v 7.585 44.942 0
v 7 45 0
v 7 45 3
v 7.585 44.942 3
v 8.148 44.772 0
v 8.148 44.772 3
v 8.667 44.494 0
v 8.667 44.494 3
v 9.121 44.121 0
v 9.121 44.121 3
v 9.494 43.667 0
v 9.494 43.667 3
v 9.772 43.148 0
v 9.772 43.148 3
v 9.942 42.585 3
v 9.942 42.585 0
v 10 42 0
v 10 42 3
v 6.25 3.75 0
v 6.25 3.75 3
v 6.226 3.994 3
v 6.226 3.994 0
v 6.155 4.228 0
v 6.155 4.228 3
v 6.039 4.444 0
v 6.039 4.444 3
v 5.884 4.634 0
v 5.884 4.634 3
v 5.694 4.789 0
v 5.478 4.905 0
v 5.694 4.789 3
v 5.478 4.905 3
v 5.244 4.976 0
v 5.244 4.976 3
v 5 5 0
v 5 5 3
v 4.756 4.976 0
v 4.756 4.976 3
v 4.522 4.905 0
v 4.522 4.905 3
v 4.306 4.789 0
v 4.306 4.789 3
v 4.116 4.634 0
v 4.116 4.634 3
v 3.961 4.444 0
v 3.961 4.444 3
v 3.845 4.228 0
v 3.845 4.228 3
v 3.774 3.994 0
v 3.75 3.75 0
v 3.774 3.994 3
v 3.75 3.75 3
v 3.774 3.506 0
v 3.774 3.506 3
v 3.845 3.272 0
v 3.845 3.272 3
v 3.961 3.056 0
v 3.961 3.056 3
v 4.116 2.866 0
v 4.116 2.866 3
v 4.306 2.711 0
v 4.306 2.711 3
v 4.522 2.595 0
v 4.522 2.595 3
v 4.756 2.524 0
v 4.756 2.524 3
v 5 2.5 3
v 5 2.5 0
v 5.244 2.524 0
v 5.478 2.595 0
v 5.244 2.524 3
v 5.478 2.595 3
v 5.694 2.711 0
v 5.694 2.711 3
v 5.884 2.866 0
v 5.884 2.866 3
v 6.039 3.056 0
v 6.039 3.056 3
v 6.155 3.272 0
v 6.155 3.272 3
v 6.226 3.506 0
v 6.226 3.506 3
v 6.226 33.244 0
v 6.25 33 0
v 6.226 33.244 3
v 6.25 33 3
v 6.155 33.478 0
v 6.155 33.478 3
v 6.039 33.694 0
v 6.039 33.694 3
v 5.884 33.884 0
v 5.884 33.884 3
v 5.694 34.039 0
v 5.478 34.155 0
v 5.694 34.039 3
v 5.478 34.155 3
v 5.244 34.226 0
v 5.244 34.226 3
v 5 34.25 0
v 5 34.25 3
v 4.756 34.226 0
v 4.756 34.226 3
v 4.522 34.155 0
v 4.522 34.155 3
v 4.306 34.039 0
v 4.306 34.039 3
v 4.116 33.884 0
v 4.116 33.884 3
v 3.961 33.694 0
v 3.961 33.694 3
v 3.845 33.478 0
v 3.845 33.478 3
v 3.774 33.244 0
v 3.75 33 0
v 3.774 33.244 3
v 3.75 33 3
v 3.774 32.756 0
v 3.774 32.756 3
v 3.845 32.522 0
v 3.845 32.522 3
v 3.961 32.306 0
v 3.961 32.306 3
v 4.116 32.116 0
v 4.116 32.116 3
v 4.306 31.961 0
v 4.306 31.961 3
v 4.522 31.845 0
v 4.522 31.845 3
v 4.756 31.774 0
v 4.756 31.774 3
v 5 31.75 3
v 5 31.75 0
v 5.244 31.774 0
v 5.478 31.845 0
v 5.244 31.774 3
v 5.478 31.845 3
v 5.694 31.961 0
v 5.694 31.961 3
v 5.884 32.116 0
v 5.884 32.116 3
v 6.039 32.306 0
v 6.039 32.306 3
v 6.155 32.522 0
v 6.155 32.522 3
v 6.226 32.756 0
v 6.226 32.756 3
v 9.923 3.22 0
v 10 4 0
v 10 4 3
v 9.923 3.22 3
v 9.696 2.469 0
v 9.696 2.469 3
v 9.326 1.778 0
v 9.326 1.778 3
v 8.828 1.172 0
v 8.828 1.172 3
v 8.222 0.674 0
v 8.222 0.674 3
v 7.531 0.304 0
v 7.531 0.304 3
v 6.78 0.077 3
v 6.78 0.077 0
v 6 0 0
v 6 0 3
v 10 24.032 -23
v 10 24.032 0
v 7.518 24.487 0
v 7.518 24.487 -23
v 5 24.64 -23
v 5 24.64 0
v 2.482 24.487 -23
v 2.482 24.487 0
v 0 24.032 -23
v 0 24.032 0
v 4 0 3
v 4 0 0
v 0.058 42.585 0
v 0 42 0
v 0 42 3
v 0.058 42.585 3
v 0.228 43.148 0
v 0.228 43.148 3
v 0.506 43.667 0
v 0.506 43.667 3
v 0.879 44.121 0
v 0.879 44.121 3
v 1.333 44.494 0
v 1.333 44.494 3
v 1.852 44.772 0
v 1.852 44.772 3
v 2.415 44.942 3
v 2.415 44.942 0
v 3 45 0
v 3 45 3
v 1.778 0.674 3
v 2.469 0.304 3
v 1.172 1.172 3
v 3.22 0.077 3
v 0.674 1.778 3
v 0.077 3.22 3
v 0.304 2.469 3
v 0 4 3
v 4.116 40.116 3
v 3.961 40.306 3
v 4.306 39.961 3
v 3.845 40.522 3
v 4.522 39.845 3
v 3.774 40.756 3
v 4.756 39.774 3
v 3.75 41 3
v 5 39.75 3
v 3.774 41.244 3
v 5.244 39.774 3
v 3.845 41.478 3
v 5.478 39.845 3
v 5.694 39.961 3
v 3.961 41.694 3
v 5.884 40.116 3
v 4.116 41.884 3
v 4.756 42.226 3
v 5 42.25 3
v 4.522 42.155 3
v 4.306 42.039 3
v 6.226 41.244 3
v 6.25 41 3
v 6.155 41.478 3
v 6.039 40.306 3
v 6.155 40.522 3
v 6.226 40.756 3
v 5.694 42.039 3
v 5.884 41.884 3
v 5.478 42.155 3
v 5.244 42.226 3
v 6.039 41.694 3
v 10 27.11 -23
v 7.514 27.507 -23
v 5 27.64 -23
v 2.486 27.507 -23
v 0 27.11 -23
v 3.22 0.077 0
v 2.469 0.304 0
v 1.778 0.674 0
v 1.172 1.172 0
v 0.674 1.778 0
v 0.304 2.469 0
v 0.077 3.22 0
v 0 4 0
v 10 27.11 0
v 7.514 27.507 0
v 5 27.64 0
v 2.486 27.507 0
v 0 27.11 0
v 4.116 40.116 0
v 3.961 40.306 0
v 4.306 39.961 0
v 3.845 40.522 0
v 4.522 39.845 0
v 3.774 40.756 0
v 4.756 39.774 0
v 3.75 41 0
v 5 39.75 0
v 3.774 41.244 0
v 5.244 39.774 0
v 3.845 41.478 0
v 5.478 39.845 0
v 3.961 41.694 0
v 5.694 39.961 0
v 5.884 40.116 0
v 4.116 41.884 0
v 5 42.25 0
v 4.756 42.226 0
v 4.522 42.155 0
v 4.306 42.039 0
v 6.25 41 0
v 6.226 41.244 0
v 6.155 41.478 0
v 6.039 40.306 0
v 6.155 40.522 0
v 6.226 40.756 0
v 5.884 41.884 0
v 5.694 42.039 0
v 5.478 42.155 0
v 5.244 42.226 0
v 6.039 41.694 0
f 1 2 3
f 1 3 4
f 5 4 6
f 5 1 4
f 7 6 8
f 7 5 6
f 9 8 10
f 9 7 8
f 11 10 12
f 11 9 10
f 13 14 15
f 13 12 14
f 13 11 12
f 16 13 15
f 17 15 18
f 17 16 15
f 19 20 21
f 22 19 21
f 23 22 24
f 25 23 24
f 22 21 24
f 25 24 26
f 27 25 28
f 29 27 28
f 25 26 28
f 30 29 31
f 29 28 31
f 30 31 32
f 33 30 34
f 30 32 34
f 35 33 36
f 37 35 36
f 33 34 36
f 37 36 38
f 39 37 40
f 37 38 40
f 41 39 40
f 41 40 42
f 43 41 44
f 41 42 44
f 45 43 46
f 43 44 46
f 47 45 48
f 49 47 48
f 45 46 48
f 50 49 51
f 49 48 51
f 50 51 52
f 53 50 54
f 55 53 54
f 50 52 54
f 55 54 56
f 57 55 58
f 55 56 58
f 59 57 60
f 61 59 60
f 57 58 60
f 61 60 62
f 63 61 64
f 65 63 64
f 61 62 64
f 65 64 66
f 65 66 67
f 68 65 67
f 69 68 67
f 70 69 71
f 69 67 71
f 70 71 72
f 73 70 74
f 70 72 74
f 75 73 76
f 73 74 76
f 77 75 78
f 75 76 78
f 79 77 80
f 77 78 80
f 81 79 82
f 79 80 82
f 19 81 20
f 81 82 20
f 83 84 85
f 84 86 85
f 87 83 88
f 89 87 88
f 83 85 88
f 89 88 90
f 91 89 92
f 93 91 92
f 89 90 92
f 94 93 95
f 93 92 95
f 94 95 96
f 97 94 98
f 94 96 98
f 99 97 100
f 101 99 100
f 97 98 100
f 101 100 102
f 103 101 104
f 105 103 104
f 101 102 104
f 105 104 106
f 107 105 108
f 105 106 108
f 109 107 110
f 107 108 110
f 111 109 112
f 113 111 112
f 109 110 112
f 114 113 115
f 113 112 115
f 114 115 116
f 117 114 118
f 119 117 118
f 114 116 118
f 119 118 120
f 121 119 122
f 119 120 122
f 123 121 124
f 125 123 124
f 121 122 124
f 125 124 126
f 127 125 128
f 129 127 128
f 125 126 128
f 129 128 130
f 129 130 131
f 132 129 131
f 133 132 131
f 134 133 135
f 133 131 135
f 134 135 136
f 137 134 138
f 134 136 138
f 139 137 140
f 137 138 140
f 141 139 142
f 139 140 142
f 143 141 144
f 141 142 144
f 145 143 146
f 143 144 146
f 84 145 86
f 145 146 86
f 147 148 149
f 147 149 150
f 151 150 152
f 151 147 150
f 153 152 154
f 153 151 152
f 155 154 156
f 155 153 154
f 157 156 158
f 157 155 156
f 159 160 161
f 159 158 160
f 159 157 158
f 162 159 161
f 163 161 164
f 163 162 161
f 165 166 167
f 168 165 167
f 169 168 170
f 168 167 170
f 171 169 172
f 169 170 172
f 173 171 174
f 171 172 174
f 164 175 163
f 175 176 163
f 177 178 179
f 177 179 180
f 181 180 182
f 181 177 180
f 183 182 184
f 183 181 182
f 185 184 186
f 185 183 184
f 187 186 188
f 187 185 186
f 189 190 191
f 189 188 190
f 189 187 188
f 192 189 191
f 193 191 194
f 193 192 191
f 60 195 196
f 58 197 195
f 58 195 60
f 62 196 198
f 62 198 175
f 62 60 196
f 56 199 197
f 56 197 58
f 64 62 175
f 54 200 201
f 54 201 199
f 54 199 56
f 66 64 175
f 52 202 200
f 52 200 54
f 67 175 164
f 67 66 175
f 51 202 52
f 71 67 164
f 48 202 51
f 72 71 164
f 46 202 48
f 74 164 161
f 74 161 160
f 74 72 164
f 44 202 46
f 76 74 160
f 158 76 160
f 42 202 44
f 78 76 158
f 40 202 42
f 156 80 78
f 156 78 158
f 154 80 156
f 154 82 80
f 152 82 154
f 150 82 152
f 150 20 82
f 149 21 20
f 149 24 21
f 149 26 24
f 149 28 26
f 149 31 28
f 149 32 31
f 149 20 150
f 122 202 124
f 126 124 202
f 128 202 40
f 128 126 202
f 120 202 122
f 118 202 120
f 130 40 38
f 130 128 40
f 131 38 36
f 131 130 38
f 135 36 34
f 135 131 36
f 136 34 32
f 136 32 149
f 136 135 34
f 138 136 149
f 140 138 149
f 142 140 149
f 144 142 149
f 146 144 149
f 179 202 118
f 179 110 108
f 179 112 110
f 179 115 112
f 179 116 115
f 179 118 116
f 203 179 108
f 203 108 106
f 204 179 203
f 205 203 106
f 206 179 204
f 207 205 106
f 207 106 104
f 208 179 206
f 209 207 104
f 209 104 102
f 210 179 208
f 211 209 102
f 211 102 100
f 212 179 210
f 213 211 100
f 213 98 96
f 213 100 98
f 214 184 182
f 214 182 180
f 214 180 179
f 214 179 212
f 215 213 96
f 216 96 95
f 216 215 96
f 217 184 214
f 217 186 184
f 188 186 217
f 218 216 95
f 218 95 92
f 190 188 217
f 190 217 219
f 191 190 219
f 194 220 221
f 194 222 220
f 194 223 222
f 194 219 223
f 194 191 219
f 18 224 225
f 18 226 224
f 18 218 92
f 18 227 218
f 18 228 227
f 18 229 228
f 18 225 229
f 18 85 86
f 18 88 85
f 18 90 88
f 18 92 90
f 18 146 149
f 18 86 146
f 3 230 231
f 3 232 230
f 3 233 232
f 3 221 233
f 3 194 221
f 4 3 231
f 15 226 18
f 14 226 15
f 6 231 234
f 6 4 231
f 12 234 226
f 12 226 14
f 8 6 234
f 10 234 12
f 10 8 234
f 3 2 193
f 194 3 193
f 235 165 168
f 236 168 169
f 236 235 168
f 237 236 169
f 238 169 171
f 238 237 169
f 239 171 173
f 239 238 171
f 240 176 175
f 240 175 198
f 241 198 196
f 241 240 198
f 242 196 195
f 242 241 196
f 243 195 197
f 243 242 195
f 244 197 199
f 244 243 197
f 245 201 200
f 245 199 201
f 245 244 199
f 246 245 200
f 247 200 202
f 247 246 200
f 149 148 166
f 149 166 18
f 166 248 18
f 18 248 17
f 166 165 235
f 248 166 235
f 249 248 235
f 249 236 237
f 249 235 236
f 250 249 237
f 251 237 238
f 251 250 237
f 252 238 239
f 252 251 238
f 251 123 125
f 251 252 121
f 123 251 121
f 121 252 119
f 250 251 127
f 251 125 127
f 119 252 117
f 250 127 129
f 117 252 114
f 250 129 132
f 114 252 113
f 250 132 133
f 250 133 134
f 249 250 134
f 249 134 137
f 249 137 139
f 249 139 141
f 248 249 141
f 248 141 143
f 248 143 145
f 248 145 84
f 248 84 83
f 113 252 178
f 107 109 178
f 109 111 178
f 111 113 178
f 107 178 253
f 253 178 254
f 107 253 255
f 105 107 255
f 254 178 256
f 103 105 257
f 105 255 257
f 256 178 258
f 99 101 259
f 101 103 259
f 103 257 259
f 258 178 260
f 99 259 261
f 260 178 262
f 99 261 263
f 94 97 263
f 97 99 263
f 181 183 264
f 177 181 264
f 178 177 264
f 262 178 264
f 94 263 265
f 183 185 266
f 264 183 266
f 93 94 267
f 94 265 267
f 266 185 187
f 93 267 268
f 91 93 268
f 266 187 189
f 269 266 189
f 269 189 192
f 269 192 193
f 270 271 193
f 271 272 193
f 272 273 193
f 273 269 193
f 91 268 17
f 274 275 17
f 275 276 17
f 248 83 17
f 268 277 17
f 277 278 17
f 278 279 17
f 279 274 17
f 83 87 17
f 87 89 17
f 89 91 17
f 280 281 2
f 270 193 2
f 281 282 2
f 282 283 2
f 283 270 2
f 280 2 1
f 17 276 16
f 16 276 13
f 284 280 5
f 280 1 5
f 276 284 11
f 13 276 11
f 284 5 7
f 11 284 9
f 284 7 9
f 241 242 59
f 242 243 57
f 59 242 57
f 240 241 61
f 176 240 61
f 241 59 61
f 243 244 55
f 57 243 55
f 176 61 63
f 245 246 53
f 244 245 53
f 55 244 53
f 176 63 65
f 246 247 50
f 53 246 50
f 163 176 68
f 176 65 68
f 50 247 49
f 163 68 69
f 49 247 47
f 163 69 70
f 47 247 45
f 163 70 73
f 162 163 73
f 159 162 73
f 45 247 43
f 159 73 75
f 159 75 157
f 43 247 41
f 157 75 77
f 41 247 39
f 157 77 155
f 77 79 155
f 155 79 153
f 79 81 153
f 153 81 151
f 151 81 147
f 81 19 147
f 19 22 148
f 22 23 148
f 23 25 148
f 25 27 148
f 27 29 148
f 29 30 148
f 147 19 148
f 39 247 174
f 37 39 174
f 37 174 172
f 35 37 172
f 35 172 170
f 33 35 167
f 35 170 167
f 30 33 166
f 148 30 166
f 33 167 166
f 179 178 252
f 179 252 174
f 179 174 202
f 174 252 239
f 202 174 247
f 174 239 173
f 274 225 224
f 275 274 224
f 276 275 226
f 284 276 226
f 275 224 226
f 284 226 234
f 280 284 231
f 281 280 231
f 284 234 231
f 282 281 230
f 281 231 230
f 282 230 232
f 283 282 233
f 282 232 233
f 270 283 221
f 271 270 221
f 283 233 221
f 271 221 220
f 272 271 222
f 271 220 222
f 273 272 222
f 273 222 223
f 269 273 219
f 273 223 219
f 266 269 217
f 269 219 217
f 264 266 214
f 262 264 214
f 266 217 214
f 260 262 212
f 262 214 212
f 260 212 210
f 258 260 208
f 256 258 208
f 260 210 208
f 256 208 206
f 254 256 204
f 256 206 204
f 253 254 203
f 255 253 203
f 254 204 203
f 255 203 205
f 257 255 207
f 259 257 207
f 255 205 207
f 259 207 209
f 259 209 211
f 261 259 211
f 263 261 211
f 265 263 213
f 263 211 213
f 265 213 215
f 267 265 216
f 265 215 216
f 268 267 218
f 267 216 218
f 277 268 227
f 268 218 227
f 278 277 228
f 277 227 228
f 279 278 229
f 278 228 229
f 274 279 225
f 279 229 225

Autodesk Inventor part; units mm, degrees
ref_plane "YZ Plane" through (0, 0, 0) normal (1, 0, 0) x (0, 1, 0)
ref_plane "XZ Plane" through (0, 0, 0) normal (0, 1, 0) x (-1, 0, 0)
ref_plane "XY Plane" through (0, 0, 0) normal (0, 0, 1) x (1, 0, 0)
sketch "Sketch1" plane through (0, 0, 0) normal (0, 0, 1) x (1, 0, 0)
  line L0 (4, 0) -> (6, 0)
  line L1 (10, 4) -> (10, 42)
  line L2 (7, 45) -> (3, 45)
  line L3 (0, 42) -> (0, 4)
  arc A0 (0, 4) -> (4, 0) centre (4, 4) ccw
  arc A1 (6, 0) -> (10, 4) centre (6, 4) ccw
  arc A2 (3, 45) -> (0, 42) centre (3, 42) ccw
  arc A3 (10, 42) -> (7, 45) centre (7, 42) ccw
  point P0 (0, 0)
  point P1 (10, 45)
  point P2 (10, 0)
  point P3 (0, 45)
  dimension "d0" = 10
  dimension "d1" = 45
  dimension "d21" = 4
  dimension "d26" = 3
extrude "Extrusion1" add sketch "Sketch1" along normal blind 3
sketch "Sketch2" plane through (0, 0, 3) normal (0, 0, 1) x (1, 0, 0)
  circle A0 centre (5, 3.75) radius 1.25
  line L0 (0, 4) -> (0, 42) projected
  line L1 (6, 0) -> (4, 0) projected
  line L2 (3, 45) -> (7, 45) projected
  circle A1 centre (5, 33) radius 1.25
  circle A2 centre (5, 41) radius 1.25
  point P0 (0, 40)
  point P1 (0, 0)
  point P2 (10, 0)
  dimension "d4" = 2.5
  dimension "d14" = 3.75
  dimension "d18" = 5
  dimension "d27" = 2.5
  dimension "d28" = 2.5
  dimension "d29" = 4
  dimension "d30" = 8
extrude "Extrusion4" cut sketch "Sketch2" against normal through all
sketch "Sketch3" plane through (0, 0, 0) normal (0, 0, -1) x (-1, 0, 0)
  circle A0 centre (-5, 3.75) radius 1.25 projected
  line L0 (-10, 4) -> (-10, 42) projected
  line L1 (0, 42) -> (0, 4) projected
  arc A1 (0, 24.0323) -> (-10, 24.0323) centre (-5, 3.75) ccw
  arc A2 (0, 27.1104) -> (-10, 27.1104) centre (-5, 3.75) ccw
  point P0 (-10, 40)
  point P1 (0, 40)
  point P2 (0, 0)
  dimension "d22" = 20.8895
  dimension "d23" = 3
extrude "Extrusion5" add sketch "Sketch3" along normal blind 23 contours L0 A2 L1 A1
equation "\"d4\" = centerHoleDia"
equation "\"d22\" = setScrewRingRad"
equation "\"d23\" = wallThickness"
equation "\"d24\" = wallHeight + wallThickness"
equation "\"centerHoleDia\" = 2.5"
equation "\"setScrewRingRad\" = 20.889512"
equation "\"wallThickness\" = 3"
equation "\"wallHeight\" = 20"
properties part number "arm"
